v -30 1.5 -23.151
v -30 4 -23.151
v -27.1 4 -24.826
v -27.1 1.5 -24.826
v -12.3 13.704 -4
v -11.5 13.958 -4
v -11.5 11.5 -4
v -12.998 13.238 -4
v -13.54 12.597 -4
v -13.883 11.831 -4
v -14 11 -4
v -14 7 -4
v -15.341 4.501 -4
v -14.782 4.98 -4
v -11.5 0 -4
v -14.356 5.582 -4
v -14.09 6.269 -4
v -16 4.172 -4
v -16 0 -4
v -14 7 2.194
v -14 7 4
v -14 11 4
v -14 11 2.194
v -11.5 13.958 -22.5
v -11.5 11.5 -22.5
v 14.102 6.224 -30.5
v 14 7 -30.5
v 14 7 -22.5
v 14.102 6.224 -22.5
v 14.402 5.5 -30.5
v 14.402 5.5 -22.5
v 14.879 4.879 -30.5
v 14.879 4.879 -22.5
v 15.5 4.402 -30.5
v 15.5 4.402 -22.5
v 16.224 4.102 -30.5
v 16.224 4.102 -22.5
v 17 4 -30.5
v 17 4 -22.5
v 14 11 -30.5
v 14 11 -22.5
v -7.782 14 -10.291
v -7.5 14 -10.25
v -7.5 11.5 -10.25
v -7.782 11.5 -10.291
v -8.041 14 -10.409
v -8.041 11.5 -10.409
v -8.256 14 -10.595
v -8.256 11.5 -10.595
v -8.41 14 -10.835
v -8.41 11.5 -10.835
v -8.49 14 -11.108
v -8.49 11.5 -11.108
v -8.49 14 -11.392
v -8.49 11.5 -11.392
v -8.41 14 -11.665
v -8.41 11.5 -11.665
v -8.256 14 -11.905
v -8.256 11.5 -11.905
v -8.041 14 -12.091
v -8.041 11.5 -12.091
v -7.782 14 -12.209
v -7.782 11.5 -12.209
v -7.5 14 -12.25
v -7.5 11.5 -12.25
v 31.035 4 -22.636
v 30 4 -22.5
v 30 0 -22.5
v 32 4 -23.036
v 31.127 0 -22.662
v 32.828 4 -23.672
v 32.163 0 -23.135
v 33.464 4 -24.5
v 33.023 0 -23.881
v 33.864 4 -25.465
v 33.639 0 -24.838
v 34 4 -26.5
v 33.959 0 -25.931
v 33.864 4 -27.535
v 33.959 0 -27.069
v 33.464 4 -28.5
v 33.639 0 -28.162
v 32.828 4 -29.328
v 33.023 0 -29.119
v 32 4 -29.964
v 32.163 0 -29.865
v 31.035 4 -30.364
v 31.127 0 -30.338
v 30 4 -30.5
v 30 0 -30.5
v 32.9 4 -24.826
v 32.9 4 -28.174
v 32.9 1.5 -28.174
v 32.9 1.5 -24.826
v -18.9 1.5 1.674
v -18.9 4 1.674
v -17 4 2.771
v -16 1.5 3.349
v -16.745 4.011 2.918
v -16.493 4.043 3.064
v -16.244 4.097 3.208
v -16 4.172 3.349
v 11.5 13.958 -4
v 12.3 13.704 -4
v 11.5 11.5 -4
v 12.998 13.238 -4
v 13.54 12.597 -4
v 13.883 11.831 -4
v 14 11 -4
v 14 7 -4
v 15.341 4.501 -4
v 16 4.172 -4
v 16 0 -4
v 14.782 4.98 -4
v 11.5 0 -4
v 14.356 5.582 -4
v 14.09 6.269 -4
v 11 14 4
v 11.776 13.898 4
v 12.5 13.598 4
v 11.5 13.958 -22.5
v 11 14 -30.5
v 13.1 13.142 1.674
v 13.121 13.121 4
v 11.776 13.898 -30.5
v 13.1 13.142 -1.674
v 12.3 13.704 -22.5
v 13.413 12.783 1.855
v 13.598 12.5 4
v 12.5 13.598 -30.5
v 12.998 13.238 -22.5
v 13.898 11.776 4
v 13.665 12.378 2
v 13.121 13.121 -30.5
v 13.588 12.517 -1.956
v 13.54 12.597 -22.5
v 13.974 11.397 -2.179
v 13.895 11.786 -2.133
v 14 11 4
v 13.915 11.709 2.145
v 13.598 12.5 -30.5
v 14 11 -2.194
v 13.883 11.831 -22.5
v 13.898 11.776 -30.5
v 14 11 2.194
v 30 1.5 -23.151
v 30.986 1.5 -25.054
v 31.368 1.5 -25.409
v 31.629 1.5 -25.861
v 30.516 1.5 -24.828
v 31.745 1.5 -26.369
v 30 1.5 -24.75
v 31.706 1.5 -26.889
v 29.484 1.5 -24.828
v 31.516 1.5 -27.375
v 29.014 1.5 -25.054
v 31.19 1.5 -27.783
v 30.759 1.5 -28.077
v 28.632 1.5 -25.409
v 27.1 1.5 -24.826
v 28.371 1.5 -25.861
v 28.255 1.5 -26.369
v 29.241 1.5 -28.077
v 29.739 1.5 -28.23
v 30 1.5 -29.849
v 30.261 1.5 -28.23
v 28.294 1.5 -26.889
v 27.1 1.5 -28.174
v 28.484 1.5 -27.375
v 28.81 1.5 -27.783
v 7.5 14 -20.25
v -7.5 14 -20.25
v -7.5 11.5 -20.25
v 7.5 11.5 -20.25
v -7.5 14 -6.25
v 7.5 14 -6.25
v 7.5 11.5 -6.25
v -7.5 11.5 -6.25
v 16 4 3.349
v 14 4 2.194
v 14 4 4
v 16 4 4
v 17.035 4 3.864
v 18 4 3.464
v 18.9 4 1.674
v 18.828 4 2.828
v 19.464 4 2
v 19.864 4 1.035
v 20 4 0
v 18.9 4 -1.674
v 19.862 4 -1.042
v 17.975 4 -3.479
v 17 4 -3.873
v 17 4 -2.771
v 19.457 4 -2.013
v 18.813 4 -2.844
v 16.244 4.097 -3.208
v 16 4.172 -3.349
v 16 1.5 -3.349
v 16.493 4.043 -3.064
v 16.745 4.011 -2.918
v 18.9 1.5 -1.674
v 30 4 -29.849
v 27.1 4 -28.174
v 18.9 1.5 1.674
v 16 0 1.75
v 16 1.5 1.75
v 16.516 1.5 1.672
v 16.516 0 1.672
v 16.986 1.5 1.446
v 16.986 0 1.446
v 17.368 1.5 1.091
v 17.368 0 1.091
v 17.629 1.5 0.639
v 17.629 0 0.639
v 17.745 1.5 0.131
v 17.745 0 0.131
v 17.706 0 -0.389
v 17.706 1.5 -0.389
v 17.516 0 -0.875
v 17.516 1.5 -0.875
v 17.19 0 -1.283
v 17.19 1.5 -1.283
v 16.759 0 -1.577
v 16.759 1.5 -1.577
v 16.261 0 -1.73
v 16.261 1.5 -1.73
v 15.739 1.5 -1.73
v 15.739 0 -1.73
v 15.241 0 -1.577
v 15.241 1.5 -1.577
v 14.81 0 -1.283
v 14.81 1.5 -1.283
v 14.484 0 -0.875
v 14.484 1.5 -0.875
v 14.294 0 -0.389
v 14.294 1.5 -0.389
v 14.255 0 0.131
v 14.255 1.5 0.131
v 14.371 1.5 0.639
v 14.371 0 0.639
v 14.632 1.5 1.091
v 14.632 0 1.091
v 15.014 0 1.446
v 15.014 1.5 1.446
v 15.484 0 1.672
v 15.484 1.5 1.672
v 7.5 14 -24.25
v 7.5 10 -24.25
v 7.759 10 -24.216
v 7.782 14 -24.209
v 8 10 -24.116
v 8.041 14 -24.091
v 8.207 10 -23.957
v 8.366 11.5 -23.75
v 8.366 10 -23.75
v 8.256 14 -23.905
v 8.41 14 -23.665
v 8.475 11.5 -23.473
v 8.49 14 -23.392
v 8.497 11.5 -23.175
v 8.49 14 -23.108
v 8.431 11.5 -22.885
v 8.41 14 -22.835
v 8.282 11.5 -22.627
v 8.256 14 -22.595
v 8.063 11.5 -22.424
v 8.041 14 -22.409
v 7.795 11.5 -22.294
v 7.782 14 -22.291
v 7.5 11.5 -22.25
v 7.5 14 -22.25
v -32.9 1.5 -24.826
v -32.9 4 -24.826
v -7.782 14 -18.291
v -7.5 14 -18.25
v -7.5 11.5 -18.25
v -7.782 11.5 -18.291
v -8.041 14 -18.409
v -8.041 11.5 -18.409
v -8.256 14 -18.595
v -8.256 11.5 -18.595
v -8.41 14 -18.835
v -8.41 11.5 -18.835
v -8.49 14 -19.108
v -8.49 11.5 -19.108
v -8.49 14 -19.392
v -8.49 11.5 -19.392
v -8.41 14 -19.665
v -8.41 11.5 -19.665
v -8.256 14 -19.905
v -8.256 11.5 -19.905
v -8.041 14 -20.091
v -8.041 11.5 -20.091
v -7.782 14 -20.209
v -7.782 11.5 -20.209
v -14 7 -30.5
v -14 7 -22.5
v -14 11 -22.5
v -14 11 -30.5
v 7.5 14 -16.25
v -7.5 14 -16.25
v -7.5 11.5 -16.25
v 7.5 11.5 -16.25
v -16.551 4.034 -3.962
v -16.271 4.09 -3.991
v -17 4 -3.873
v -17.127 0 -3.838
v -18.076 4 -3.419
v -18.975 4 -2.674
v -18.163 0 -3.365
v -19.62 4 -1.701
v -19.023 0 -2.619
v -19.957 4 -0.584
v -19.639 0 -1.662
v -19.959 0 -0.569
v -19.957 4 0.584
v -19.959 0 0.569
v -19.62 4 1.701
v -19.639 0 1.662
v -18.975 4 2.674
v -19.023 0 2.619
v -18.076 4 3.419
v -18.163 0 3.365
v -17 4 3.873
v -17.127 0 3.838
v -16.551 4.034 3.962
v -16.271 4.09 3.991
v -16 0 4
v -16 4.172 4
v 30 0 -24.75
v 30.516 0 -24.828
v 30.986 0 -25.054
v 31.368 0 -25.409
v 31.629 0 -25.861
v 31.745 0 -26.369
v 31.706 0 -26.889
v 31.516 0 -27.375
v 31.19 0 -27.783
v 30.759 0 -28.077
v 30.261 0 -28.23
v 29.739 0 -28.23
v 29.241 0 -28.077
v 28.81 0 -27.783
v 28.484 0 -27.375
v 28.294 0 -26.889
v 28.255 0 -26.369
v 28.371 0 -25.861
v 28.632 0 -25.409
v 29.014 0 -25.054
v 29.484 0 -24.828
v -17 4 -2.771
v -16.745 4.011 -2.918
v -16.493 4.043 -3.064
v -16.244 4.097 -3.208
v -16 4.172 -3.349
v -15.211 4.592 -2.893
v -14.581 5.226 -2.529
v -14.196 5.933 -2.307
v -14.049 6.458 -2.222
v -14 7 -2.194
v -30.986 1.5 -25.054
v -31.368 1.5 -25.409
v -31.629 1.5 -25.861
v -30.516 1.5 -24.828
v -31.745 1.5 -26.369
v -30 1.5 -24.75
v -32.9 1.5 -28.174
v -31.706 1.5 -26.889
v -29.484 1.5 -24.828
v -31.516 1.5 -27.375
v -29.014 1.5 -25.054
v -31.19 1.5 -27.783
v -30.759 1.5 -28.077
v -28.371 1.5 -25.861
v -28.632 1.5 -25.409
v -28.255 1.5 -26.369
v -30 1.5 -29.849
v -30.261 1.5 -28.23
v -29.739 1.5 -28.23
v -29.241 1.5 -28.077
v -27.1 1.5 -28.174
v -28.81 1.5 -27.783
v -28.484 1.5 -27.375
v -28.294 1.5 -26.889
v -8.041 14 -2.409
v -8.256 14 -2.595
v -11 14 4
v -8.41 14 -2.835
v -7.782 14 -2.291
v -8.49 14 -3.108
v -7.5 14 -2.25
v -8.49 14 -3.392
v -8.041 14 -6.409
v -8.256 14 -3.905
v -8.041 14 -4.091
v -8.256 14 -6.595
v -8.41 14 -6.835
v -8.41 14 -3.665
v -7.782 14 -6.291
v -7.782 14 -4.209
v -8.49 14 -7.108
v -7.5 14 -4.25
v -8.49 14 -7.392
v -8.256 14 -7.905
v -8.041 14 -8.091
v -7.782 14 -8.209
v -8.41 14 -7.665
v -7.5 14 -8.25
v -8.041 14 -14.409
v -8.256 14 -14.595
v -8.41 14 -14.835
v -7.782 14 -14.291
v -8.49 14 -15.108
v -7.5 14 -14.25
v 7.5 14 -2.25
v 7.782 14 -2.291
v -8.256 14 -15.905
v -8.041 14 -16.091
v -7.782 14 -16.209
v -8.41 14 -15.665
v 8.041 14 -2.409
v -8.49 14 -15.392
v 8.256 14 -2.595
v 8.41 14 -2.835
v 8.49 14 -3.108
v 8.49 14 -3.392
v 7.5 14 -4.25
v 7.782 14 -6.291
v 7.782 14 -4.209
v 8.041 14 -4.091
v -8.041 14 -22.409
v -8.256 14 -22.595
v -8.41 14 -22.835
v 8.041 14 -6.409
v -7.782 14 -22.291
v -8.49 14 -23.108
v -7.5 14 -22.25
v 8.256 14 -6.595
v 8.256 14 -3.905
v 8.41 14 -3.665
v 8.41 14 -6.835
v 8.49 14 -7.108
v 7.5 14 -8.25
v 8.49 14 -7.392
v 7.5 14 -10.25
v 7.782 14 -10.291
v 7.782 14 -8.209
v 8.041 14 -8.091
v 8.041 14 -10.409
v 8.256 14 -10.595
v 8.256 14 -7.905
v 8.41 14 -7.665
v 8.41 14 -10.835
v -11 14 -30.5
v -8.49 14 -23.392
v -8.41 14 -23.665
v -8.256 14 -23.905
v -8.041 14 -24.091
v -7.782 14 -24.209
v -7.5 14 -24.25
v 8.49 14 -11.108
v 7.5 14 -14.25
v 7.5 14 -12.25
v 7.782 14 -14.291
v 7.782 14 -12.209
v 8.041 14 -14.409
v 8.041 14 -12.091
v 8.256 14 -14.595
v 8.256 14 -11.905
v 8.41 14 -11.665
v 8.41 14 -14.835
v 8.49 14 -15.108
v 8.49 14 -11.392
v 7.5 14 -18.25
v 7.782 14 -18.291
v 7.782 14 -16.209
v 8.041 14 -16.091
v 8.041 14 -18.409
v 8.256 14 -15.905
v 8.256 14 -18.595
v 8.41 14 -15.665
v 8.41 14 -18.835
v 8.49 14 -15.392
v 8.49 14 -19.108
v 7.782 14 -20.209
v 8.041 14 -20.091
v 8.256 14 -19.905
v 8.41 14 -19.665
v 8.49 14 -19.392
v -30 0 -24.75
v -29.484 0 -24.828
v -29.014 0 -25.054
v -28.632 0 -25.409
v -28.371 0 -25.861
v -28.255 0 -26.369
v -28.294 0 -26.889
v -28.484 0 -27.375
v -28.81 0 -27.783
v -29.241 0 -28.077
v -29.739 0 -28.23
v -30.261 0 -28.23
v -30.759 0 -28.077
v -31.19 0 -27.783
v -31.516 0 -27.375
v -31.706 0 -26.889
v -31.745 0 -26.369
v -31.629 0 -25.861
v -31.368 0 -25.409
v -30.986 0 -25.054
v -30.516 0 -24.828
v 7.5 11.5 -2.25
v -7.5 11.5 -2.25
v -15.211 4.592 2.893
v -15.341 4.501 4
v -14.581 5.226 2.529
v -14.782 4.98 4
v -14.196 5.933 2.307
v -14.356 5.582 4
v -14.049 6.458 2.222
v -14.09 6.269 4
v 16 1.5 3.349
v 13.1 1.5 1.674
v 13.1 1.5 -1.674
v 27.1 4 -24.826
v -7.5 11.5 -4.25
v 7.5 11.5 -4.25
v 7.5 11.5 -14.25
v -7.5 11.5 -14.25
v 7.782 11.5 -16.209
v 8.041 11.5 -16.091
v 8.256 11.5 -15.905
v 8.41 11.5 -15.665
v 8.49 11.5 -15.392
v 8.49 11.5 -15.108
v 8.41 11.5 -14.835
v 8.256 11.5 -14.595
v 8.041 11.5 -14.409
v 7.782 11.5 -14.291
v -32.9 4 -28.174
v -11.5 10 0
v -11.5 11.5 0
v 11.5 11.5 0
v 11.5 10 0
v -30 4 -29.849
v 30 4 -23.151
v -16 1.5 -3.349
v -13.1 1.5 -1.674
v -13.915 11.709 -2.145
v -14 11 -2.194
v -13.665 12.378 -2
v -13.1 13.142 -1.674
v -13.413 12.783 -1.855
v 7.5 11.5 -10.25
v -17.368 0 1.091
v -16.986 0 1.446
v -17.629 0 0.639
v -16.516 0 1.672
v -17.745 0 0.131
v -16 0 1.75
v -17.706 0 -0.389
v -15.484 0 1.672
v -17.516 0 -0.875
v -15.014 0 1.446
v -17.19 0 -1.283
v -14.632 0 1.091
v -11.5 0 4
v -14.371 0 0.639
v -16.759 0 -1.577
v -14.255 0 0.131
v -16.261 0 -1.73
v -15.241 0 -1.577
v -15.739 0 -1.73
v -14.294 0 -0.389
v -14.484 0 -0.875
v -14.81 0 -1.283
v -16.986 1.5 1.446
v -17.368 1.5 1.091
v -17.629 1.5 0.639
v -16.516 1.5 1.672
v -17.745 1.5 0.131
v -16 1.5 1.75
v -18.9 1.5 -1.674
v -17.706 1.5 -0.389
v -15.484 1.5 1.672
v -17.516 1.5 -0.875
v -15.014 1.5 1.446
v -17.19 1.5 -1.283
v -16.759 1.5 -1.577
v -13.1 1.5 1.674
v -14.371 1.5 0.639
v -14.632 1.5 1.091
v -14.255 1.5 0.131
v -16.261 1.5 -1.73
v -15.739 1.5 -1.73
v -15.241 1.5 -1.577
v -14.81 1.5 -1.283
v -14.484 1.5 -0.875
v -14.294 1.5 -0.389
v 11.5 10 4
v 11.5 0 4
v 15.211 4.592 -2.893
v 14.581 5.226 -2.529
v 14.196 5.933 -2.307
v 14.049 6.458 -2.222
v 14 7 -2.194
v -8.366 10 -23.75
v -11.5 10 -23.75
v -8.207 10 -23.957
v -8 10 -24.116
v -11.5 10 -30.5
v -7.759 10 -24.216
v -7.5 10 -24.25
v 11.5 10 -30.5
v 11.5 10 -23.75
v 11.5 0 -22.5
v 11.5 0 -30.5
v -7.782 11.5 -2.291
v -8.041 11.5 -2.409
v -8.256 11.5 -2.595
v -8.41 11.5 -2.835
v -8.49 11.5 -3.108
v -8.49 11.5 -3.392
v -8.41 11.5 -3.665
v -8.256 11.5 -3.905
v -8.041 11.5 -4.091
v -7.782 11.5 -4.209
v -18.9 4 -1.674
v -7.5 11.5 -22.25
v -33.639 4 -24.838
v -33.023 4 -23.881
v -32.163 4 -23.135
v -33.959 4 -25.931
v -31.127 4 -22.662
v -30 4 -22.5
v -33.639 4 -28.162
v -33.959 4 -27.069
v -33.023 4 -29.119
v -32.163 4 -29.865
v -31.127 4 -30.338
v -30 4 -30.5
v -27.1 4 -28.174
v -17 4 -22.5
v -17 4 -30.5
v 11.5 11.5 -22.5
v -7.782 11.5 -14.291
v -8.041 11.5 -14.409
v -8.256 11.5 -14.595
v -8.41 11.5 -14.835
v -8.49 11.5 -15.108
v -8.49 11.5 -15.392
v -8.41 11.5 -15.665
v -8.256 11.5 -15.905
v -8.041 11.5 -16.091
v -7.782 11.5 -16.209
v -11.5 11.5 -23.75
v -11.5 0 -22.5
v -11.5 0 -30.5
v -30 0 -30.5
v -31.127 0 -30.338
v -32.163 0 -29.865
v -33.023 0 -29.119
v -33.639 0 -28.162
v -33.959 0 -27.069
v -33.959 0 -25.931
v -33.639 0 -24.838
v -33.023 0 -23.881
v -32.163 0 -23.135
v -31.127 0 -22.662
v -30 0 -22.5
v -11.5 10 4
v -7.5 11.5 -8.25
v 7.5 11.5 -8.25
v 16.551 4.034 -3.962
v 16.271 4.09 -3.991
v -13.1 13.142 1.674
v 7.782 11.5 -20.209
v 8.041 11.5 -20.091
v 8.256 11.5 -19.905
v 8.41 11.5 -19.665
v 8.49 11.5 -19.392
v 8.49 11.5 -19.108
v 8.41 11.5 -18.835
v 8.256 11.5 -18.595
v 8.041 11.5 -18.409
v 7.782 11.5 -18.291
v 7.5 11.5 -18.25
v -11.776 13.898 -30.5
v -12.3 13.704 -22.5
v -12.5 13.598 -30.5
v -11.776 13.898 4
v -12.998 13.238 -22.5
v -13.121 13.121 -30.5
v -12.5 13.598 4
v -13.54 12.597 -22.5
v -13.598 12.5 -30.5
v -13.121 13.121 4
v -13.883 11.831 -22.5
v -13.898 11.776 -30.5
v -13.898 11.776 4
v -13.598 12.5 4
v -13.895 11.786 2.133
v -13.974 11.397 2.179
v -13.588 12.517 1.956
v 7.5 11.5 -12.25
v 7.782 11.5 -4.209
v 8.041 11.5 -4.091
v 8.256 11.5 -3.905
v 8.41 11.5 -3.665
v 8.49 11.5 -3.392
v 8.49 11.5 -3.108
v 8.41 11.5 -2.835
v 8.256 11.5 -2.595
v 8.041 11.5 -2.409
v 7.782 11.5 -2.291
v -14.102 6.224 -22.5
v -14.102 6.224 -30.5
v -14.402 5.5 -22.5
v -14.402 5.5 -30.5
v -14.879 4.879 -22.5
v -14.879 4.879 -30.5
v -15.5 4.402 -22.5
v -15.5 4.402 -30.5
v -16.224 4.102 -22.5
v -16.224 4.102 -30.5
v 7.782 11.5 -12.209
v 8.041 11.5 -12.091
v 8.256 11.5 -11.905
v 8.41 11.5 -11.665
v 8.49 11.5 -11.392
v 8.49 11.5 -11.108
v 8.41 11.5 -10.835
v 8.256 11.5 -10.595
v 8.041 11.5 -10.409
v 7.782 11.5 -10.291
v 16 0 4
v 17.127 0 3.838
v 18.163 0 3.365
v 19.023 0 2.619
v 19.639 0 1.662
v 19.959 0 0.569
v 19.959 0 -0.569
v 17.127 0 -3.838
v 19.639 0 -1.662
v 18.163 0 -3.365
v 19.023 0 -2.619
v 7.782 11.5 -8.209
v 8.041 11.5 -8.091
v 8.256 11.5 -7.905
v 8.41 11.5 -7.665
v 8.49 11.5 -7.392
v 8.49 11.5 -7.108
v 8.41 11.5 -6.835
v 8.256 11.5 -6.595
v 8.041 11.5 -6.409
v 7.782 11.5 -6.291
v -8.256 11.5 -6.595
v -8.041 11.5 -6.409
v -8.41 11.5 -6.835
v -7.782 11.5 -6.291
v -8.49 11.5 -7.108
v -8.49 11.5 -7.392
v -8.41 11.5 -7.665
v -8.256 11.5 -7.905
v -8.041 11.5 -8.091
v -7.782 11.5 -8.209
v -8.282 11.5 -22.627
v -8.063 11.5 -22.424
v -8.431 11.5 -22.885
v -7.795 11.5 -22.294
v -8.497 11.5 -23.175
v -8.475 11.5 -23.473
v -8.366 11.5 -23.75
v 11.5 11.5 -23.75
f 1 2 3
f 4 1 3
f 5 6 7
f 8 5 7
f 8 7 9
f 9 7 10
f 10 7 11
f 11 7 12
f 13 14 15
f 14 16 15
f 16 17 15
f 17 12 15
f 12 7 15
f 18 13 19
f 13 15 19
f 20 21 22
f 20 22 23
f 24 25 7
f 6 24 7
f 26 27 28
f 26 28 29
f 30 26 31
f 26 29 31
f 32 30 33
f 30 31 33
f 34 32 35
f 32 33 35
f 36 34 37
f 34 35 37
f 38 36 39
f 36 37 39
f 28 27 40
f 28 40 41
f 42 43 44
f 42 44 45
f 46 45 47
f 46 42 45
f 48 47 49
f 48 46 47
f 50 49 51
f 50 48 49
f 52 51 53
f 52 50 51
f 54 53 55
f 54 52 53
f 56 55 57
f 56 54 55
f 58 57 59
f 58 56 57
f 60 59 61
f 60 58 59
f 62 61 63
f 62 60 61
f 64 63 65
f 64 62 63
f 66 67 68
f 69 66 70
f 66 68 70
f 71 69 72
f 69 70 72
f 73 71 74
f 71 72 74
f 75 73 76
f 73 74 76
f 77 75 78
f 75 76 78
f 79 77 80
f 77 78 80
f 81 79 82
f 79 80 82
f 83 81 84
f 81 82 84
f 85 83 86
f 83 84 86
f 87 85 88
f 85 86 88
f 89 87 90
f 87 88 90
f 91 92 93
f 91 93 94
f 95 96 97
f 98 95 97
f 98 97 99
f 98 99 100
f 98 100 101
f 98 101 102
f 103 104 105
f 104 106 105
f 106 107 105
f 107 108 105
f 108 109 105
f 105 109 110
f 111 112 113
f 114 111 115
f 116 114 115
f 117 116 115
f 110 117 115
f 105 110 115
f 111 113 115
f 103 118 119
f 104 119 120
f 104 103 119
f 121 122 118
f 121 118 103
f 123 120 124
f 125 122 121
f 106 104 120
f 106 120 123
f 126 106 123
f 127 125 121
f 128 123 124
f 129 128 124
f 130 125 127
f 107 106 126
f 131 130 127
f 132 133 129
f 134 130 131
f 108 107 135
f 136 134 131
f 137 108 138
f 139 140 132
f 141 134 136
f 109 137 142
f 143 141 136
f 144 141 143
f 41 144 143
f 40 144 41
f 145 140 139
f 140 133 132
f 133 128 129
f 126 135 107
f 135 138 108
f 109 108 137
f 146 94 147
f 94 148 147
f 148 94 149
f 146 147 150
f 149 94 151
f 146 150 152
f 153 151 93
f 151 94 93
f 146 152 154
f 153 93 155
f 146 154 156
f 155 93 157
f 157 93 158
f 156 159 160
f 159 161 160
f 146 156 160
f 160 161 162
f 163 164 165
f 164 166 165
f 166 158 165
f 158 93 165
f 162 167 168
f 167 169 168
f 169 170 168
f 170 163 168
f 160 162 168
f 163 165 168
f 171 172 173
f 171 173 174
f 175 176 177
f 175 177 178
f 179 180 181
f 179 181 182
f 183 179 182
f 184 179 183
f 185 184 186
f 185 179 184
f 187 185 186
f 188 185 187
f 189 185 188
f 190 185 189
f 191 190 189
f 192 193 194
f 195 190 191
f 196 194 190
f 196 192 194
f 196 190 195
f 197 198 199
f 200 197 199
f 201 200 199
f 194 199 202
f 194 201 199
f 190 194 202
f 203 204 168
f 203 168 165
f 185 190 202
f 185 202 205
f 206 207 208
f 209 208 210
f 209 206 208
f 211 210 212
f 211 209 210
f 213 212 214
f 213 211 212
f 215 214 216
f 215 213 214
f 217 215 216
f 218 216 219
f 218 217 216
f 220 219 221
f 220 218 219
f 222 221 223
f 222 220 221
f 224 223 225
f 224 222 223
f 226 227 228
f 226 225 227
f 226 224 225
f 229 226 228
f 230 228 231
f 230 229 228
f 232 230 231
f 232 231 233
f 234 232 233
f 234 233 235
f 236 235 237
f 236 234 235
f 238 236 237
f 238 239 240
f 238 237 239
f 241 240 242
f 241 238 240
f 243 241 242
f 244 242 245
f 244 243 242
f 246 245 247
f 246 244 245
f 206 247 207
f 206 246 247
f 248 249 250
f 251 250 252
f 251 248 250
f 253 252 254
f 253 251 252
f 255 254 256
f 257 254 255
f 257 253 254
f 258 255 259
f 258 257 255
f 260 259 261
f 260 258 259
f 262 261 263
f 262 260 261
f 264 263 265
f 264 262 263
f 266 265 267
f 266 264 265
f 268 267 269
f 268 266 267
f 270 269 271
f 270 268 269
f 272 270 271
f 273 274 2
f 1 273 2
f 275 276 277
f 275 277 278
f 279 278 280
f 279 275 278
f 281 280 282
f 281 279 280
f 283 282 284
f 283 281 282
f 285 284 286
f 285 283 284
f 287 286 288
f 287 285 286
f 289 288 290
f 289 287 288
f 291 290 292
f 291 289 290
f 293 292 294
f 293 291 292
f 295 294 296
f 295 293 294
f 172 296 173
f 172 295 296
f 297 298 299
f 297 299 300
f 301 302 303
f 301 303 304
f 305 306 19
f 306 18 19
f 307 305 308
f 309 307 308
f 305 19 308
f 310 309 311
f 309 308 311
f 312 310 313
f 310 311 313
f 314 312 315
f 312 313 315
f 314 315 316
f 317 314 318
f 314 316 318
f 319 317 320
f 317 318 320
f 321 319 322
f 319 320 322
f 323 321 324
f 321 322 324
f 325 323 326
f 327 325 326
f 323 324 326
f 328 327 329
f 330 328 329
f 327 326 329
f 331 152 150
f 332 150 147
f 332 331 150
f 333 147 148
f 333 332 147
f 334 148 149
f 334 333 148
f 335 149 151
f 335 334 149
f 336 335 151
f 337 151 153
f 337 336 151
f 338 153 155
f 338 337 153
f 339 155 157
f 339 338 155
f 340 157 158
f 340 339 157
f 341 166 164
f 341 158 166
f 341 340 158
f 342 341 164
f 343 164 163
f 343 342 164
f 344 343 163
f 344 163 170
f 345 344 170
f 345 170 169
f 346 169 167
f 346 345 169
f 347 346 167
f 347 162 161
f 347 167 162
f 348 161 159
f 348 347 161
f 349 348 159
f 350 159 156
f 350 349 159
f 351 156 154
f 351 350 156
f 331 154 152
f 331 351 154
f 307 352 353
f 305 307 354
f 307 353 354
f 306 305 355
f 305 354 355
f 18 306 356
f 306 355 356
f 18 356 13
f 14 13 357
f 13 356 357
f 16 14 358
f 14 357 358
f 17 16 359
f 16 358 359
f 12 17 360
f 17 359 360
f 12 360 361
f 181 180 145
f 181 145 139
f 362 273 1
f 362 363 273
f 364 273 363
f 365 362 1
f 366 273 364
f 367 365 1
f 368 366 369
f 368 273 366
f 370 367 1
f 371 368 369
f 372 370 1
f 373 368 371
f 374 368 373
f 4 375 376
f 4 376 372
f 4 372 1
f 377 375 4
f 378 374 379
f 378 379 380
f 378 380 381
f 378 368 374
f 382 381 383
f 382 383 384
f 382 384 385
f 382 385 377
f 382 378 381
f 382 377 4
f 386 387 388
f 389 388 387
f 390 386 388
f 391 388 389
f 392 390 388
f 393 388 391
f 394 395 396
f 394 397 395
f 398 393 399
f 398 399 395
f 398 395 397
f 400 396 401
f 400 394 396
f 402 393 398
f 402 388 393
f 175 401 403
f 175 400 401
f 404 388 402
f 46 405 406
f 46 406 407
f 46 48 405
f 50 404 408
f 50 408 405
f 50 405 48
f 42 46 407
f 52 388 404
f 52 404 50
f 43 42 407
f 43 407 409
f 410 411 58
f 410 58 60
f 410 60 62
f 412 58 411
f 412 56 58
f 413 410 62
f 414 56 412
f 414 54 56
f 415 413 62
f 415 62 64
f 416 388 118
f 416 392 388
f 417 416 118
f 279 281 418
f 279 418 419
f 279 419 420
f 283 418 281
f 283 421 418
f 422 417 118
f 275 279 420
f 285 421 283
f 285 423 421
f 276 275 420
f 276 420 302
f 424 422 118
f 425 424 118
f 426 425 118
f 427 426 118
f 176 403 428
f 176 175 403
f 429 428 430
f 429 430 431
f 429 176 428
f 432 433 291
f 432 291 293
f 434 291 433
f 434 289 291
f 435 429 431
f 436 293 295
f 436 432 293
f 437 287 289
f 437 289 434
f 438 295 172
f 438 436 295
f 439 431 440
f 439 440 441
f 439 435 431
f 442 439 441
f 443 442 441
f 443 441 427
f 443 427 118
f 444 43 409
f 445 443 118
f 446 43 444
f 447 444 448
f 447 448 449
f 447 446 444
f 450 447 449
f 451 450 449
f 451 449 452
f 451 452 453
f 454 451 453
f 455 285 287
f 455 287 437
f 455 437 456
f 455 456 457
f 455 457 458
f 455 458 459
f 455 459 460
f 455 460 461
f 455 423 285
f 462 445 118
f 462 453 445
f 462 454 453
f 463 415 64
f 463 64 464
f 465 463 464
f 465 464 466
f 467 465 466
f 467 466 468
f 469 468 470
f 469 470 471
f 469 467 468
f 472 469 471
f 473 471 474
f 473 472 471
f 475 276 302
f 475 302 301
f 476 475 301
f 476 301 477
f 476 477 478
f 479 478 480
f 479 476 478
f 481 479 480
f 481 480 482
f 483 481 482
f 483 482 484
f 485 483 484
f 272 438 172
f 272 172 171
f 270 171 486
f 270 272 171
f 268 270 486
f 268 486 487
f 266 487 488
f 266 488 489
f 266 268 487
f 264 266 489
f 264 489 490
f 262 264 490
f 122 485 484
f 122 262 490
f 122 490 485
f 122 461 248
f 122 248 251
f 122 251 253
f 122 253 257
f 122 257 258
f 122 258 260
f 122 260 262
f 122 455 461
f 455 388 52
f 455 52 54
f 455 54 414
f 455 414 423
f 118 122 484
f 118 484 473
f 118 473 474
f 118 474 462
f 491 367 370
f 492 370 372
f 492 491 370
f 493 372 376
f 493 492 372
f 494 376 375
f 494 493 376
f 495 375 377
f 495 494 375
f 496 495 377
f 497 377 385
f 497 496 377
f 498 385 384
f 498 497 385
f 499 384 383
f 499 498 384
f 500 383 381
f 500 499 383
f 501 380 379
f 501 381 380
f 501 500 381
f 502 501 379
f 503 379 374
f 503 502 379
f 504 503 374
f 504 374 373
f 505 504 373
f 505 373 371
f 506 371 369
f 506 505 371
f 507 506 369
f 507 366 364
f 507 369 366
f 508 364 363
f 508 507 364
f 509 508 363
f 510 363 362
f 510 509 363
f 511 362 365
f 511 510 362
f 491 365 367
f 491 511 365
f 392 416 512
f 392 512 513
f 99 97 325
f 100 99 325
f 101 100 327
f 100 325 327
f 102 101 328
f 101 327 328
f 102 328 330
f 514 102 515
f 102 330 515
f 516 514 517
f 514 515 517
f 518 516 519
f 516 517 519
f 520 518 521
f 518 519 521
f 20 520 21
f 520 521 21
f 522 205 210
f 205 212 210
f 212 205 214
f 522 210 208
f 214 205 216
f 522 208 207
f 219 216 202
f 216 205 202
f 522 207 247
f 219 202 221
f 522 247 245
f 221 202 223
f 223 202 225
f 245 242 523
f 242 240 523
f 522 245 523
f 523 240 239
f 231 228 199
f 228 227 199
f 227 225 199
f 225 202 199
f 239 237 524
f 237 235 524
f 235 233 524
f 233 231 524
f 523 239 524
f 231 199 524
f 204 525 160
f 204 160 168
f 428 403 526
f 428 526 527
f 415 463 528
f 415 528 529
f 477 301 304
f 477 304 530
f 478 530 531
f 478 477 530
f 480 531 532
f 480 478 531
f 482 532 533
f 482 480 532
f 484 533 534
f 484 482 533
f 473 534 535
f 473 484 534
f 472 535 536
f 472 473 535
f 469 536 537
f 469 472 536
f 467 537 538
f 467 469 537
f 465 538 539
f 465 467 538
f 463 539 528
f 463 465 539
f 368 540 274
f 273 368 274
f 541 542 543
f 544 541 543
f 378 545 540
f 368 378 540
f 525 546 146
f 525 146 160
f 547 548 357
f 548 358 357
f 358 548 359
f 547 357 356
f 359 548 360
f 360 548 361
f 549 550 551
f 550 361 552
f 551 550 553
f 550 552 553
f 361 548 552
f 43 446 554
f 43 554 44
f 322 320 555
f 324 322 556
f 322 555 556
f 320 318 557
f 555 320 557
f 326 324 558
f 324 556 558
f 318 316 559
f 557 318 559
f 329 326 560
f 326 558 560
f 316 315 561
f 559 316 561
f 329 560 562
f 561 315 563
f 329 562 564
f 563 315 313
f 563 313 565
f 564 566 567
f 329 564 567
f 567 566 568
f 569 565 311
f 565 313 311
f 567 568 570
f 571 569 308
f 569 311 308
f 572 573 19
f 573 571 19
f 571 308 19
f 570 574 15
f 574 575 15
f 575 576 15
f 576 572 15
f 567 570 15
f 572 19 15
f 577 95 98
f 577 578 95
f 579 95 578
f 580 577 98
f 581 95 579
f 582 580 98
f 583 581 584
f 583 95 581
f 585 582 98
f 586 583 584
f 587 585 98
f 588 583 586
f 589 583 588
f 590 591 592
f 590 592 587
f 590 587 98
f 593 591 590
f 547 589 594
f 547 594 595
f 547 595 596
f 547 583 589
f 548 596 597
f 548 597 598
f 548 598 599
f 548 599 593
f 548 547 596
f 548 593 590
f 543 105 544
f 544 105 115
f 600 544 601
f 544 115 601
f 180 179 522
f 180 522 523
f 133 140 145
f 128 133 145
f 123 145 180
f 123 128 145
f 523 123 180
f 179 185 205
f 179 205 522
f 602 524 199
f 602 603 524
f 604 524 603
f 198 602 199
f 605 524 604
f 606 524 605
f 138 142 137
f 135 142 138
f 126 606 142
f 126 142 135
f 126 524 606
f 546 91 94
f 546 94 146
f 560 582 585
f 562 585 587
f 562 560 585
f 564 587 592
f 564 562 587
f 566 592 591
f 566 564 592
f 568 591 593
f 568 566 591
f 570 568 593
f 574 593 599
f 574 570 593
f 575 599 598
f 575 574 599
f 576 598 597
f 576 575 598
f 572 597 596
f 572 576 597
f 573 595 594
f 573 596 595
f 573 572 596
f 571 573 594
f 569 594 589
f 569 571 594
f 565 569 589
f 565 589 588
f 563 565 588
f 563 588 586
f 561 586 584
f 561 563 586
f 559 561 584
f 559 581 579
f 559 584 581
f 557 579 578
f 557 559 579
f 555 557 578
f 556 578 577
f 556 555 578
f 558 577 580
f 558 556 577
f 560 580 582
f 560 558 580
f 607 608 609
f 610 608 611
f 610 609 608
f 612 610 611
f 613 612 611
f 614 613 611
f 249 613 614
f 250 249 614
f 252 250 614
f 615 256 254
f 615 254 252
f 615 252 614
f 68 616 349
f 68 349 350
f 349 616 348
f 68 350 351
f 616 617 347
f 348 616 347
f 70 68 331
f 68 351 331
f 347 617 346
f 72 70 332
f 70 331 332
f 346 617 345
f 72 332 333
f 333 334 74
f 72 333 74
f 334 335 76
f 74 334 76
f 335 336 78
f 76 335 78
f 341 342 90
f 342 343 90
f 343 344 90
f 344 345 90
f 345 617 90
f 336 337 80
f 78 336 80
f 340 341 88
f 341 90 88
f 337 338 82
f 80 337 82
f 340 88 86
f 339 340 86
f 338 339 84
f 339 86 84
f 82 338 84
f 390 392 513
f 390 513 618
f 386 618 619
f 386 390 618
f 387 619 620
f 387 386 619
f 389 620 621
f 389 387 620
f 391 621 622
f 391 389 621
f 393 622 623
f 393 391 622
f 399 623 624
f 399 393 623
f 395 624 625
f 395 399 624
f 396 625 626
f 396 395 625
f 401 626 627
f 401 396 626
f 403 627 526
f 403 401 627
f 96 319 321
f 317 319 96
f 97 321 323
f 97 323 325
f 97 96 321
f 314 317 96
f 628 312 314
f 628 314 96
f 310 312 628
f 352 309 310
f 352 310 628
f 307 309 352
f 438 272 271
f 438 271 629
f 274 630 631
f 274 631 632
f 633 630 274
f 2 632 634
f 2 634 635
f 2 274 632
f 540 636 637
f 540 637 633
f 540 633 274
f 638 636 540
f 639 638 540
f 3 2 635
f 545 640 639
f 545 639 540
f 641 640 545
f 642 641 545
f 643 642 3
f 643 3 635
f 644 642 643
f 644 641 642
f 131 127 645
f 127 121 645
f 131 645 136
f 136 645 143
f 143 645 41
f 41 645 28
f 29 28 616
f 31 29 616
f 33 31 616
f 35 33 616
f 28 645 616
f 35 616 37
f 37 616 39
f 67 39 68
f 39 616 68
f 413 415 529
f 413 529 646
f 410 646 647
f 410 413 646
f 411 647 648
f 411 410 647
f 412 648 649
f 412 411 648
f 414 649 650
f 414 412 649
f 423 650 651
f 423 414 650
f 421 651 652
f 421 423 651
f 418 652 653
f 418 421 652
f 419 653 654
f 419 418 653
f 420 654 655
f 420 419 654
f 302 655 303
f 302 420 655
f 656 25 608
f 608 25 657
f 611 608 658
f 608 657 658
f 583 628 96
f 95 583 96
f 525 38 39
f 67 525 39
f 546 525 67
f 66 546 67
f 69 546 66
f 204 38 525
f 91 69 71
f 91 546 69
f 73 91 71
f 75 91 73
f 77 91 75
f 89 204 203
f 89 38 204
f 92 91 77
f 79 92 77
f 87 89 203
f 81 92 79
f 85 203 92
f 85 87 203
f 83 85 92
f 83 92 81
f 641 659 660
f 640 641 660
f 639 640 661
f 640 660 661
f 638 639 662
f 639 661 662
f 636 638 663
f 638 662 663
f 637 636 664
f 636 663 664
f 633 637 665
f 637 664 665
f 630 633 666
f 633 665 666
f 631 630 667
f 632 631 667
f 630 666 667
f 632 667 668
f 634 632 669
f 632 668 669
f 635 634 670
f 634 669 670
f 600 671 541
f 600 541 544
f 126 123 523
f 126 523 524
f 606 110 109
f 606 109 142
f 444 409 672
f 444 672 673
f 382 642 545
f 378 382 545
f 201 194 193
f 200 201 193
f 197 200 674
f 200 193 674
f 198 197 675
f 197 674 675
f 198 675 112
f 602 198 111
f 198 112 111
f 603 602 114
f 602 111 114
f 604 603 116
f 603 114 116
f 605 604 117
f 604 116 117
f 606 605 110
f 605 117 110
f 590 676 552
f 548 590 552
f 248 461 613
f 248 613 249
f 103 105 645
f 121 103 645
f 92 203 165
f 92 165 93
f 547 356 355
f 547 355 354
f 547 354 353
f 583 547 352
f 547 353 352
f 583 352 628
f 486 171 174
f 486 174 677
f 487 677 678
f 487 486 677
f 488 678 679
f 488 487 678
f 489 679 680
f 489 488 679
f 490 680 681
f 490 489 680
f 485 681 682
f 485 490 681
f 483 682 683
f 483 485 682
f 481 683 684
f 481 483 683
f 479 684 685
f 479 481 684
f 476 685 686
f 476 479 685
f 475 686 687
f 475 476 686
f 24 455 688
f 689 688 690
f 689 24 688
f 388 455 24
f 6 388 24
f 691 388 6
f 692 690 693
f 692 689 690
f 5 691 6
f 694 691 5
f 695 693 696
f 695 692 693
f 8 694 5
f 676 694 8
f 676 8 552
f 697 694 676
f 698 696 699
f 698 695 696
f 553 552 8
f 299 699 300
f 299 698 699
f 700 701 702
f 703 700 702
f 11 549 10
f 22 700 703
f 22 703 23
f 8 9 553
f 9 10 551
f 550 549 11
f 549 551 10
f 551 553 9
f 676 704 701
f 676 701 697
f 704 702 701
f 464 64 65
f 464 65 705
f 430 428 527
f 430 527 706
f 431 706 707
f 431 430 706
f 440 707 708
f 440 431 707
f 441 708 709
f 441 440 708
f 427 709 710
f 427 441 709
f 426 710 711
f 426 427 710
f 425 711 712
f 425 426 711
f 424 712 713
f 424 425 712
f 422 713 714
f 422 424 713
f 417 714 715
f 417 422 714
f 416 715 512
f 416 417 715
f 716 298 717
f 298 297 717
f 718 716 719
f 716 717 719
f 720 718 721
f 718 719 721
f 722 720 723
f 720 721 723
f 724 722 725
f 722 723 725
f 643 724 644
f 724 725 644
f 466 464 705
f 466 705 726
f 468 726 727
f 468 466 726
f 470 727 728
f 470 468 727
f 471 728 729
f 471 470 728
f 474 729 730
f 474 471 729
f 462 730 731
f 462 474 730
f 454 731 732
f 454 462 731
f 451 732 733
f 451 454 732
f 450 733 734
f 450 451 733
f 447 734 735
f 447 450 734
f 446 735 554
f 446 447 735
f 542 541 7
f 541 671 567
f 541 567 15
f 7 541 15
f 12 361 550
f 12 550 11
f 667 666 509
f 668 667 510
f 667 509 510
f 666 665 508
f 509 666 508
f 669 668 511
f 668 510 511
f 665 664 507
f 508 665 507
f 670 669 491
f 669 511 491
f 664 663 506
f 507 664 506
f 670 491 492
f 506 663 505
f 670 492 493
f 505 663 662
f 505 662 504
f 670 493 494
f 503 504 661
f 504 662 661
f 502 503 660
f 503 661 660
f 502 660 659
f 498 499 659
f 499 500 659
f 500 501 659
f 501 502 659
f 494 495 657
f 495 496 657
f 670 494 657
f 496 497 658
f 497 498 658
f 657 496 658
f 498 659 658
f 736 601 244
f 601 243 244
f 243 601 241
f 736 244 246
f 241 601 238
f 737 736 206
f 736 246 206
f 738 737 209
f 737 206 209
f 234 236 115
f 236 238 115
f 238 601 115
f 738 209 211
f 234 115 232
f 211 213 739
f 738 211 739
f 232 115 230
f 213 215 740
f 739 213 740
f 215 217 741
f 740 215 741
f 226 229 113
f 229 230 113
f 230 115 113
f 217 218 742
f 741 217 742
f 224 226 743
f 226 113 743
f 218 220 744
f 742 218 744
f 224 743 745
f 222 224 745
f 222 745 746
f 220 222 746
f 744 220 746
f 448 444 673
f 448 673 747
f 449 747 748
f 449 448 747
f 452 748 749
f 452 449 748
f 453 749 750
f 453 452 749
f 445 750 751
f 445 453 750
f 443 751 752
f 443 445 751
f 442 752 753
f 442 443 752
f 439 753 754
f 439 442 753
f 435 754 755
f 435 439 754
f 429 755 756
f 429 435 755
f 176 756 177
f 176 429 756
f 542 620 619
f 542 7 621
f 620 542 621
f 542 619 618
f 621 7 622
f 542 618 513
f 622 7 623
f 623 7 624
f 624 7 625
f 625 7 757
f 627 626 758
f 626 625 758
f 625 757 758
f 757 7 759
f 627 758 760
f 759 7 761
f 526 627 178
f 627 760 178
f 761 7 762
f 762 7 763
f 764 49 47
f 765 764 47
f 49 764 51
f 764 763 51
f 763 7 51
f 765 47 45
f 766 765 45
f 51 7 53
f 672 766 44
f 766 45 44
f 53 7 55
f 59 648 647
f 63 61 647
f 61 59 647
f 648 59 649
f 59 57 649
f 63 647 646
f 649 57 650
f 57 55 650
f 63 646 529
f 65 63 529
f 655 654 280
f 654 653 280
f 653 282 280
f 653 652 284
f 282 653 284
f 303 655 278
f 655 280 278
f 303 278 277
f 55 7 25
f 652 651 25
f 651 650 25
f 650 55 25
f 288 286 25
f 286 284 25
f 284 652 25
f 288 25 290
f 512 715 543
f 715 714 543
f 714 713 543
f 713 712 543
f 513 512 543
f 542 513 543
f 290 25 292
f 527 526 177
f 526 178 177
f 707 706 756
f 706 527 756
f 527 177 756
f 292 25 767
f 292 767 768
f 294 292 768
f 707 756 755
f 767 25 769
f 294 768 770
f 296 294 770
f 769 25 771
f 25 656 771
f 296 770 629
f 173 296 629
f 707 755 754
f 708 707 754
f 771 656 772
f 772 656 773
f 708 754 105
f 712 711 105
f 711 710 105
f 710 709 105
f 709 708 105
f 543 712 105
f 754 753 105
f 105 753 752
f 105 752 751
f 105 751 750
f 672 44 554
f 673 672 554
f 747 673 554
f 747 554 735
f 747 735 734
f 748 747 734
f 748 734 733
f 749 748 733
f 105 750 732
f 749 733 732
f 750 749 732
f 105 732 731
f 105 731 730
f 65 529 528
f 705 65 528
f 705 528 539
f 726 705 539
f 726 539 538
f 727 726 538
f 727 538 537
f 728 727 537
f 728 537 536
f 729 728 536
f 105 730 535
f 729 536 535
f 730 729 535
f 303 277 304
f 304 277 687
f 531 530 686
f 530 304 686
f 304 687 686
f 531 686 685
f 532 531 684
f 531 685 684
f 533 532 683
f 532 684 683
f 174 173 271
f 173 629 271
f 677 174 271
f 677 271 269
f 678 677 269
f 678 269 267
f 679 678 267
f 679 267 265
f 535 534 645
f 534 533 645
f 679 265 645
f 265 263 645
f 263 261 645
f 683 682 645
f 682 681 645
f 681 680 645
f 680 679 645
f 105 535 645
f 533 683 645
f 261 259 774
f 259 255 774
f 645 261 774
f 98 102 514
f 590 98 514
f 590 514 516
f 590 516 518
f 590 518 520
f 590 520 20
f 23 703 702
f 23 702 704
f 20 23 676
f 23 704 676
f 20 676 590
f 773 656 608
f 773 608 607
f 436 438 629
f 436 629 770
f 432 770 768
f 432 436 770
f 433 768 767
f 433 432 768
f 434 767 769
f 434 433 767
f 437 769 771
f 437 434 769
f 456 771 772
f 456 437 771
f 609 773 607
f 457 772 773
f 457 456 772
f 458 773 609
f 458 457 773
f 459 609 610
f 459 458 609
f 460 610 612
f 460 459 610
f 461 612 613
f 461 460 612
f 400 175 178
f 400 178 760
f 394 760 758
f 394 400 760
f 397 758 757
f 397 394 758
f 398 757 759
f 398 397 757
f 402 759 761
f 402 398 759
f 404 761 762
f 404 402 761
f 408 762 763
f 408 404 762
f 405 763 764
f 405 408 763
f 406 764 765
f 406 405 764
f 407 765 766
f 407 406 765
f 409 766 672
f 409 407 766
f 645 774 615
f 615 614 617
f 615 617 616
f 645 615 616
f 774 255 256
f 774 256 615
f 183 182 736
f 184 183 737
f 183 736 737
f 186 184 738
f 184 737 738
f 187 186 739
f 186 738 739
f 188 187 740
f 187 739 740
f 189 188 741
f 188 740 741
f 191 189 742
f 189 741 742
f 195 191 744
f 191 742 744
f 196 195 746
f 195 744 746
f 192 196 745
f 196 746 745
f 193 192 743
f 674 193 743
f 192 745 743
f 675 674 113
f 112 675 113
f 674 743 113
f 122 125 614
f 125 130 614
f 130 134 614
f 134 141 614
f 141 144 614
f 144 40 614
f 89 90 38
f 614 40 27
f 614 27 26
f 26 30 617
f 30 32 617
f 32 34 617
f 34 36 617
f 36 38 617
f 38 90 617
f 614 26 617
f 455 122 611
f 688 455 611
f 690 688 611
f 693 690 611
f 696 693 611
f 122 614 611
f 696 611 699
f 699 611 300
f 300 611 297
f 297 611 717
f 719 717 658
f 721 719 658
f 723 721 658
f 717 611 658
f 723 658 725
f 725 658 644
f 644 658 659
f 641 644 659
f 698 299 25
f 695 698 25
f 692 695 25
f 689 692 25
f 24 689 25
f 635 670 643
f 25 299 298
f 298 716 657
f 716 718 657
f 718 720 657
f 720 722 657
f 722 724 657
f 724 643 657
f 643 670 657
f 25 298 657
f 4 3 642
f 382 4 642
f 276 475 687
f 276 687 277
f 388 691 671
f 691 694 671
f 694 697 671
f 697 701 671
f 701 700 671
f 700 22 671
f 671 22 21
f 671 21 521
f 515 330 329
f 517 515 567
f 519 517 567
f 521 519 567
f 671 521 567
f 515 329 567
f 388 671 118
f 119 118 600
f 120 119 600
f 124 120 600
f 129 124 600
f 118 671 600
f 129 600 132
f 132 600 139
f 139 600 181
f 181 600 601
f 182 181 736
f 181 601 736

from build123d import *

# Parameters (mm, degrees)
SKETCH1_R           = 4
SKETCH1_R_2         = 1.75
BOSS_EXTRUDE1_DEPTH = 11.5
SKETCH2_R           = 1.75
BOSS_EXTRUDE2_DEPTH = 2.5
CUT_EXTRUDE1_START  = -10
SKETCH3_R           = 1.75
CUT_EXTRUDE1_DEPTH  = 10
CUT_EXTRUDE2_DEPTH  = 12.5
SKETCH5_W           = 23
SKETCH5_H           = 4
SKETCH5_H_2         = 6.75
BOSS_EXTRUDE3_DEPTH = 1.5
FILLET1_R           = 3
CUT_EXTRUDE3_REACH  = 49.773


with BuildPart() as part:
    # Sketch1 → Boss-Extrude1 (new body)
    # profile 1 of 8: a face of its own
    with BuildSketch(Plane(origin=(0, 0, 0), x_dir=(1, 0, 0), z_dir=(0, 1, 0))):
        with Locations((-30, 26.5)):
            Circle(SKETCH1_R)
        with Locations(Location((-30, 26.5, 0), (0, 0, 270))):
            Circle(SKETCH1_R_2, mode=Mode.SUBTRACT)
    # profile 2 of 8: a face of its own
    with BuildSketch(Plane(origin=(0, 0, 0), x_dir=(1, 0, 0), z_dir=(0, 1, 0))):
        with BuildLine():
            Line((-30, 22.5), (-11.5, 22.5))
            Line((-11.5, 22.5), (-11.5, 30.5))
            Line((-11.5, 30.5), (-30, 30.5))
            ThreePointArc((-30, 30.5), (-27.171572875, 29.328427125), (-26, 26.5))
            ThreePointArc((-26, 26.5), (-27.171572875, 23.671572875), (-30, 22.5))
        make_face()
    # profile 3 of 8: a face of its own
    with BuildSketch(Plane(origin=(0, 0, 0), x_dir=(1, 0, 0), z_dir=(0, 1, 0))):
        with BuildLine():
            Line((11.5, 30.5), (11.5, 22.5))
            Line((11.5, 22.5), (30, 22.5))
            ThreePointArc((30, 22.5), (26, 26.5), (30, 30.5))
            Line((30, 30.5), (11.5, 30.5))
        make_face()
    # profile 4 of 8: a face of its own
    with BuildSketch(Plane(origin=(0, 0, 0), x_dir=(1, 0, 0), z_dir=(0, 1, 0))):
        with Locations((30, 26.5)):
            Circle(SKETCH1_R)
        with Locations(Location((30, 26.5, 0), (0, 0, 270))):
            Circle(SKETCH1_R_2, mode=Mode.SUBTRACT)
    # profile 5 of 8: a face of its own
    with BuildSketch(Plane(origin=(0, 0, 0), x_dir=(1, 0, 0), z_dir=(0, 1, 0))):
        with Locations((16, 0)):
            Circle(SKETCH1_R)
        with Locations(Location((16, 0, 0), (0, 0, 270))):
            Circle(SKETCH1_R_2, mode=Mode.SUBTRACT)
    # profile 6 of 8: a face of its own
    with BuildSketch(Plane(origin=(0, 0, 0), x_dir=(1, 0, 0), z_dir=(0, 1, 0))):
        with BuildLine():
            Line((11.5, 4), (11.5, -4))
            Line((11.5, -4), (16, -4))
            ThreePointArc((16, -4), (12, 0), (16, 4))
            Line((16, 4), (11.5, 4))
        make_face()
    # profile 7 of 8: a face of its own
    with BuildSketch(Plane(origin=(0, 0, 0), x_dir=(1, 0, 0), z_dir=(0, 1, 0))):
        with BuildLine():
            Line((-16, -4), (-11.5, -4))
            Line((-11.5, -4), (-11.5, 4))
            Line((-11.5, 4), (-16, 4))
            ThreePointArc((-16, 4), (-13.171572875, 2.828427125), (-12, 0))
            ThreePointArc((-12, 0), (-13.171572875, -2.828427125), (-16, -4))
        make_face()
    # profile 8 of 8: a face of its own
    with BuildSketch(Plane(origin=(0, 0, 0), x_dir=(1, 0, 0), z_dir=(0, 1, 0))):
        with Locations((-16, 0)):
            Circle(SKETCH1_R)
        with Locations(Location((-16, 0, 0), (0, 0, 270))):
            Circle(SKETCH1_R_2, mode=Mode.SUBTRACT)
    extrude(amount=BOSS_EXTRUDE1_DEPTH)

    # Sketch2 → Boss-Extrude2 (add)
    # profile 1 of 5: a face of its own
    with BuildSketch(Plane(origin=(0, 11.5, 0), x_dir=(1, 0, 0), z_dir=(0, 1, 0))):
        with BuildLine():
            Line((-11.5, 30.5), (-30, 30.5))
            ThreePointArc((-30, 30.5), (-34, 26.5), (-30, 22.5))
            Line((-30, 22.5), (-11.5, 22.5))
            Line((-11.5, 22.5), (-11.5, 30.5))
        make_face()
        with Locations(Location((-30, 26.5, 0), (0, 0, 270))):
            Circle(SKETCH2_R, mode=Mode.SUBTRACT)
    # profile 2 of 5: a face of its own
    with BuildSketch(Plane(origin=(0, 11.5, 0), x_dir=(1, 0, 0), z_dir=(0, 1, 0))):
        Polygon((11.5, 30.5), (-11.5, 30.5), (-11.5, 22.5), (-11.5, 4), (-11.5, -4), (11.5, -4), (11.5, 4), (11.5, 22.5), align=None)
    # profile 3 of 5: a face of its own
    with BuildSketch(Plane(origin=(0, 11.5, 0), x_dir=(1, 0, 0), z_dir=(0, 1, 0))):
        with BuildLine():
            Line((30, 30.5), (11.5, 30.5))
            Line((11.5, 30.5), (11.5, 22.5))
            Line((11.5, 22.5), (30, 22.5))
            ThreePointArc((30, 22.5), (34, 26.5), (30, 30.5))
        make_face()
        with Locations(Location((30, 26.5, 0), (0, 0, 270))):
            Circle(SKETCH2_R, mode=Mode.SUBTRACT)
    # profile 4 of 5: a face of its own
    with BuildSketch(Plane(origin=(0, 11.5, 0), x_dir=(1, 0, 0), z_dir=(0, 1, 0))):
        with BuildLine():
            Line((16, 4), (11.5, 4))
            Line((11.5, 4), (11.5, -4))
            Line((11.5, -4), (16, -4))
            ThreePointArc((16, -4), (20, 0), (16, 4))
        make_face()
        with Locations(Location((16, 0, 0), (0, 0, 270))):
            Circle(SKETCH2_R, mode=Mode.SUBTRACT)
    # profile 5 of 5: a face of its own
    with BuildSketch(Plane(origin=(0, 11.5, 0), x_dir=(1, 0, 0), z_dir=(0, 1, 0))):
        with BuildLine():
            Line((-11.5, -4), (-11.5, 4))
            Line((-11.5, 4), (-16, 4))
            ThreePointArc((-16, 4), (-20, 0), (-16, -4))
            Line((-16, -4), (-11.5, -4))
        make_face()
        with Locations(Location((-16, 0, 0), (0, 0, 270))):
            Circle(SKETCH2_R, mode=Mode.SUBTRACT)
    extrude(amount=BOSS_EXTRUDE2_DEPTH)

    # Sketch3 → Cut-Extrude1 (cut)
    # profile 1 of 10: a face of its own
    with BuildSketch(Plane(origin=(0, 14, 0), x_dir=(1, 0, 0), z_dir=(0, 1, 0)).offset(CUT_EXTRUDE1_START)):
        with BuildLine():
            ThreePointArc((-26, 26.5), (-27.171572875, 29.328427125), (-30, 30.5))
            ThreePointArc((-30, 30.5), (-34, 26.5), (-30, 22.5))
            ThreePointArc((-30, 22.5), (-27.171572875, 23.671572875), (-26, 26.5))
        make_face()
        with Locations(Location((-30, 26.5, 0), (0, 0, 270))):
            Circle(SKETCH3_R, mode=Mode.SUBTRACT)
    # profile 2 of 10: a face of its own
    with BuildSketch(Plane(origin=(0, 14, 0), x_dir=(1, 0, 0), z_dir=(0, 1, 0)).offset(CUT_EXTRUDE1_START)):
        with BuildLine():
            Line((-14, 22.5), (-14, 30.5))
            Line((-14, 30.5), (-30, 30.5))
            ThreePointArc((-30, 30.5), (-27.171572875, 29.328427125), (-26, 26.5))
            ThreePointArc((-26, 26.5), (-27.171572875, 23.671572875), (-30, 22.5))
            Line((-30, 22.5), (-14, 22.5))
        make_face()
    # profile 3 of 10: a face of its own
    with BuildSketch(Plane(origin=(0, 14, 0), x_dir=(1, 0, 0), z_dir=(0, 1, 0)).offset(CUT_EXTRUDE1_START)):
        with BuildLine():
            Line((30, 30.5), (14, 30.5))
            Line((14, 30.5), (14, 22.5))
            Line((14, 22.5), (30, 22.5))
            ThreePointArc((30, 22.5), (26, 26.5), (30, 30.5))
        make_face()
    # profile 4 of 10: a face of its own
    with BuildSketch(Plane(origin=(0, 14, 0), x_dir=(1, 0, 0), z_dir=(0, 1, 0)).offset(CUT_EXTRUDE1_START)):
        with BuildLine():
            ThreePointArc((34, 26.5), (32.828427125, 29.328427125), (30, 30.5))
            ThreePointArc((30, 30.5), (26, 26.5), (30, 22.5))
            ThreePointArc((30, 22.5), (32.828427125, 23.671572875), (34, 26.5))
        make_face()
        with Locations(Location((30, 26.5, 0), (0, 0, 270))):
            Circle(SKETCH3_R, mode=Mode.SUBTRACT)
    # profile 5 of 10: a face of its own
    with BuildSketch(Plane(origin=(0, 14, 0), x_dir=(1, 0, 0), z_dir=(0, 1, 0)).offset(CUT_EXTRUDE1_START)):
        with BuildLine():
            ThreePointArc((16, 4), (14.96472382, 3.863703305), (14, 3.464101615))
            Line((14, 3.464101615), (14, -3.464101615))
            ThreePointArc((14, -3.464101615), (14.96472382, -3.863703305), (16, -4))
            ThreePointArc((16, -4), (18.828427125, -2.828427125), (20, 0))
            ThreePointArc((20, 0), (18.828427125, 2.828427125), (16, 4))
        make_face()
        with Locations(Location((16, 0, 0), (0, 0, 270))):
            Circle(SKETCH3_R, mode=Mode.SUBTRACT)
    # profile 6 of 10: a face of its own
    with BuildSketch(Plane(origin=(0, 14, 0), x_dir=(1, 0, 0), z_dir=(0, 1, 0)).offset(CUT_EXTRUDE1_START)):
        with BuildLine():
            Line((-14, -3.464101615), (-14, 3.464101615))
            ThreePointArc((-14, 3.464101615), (-14.96472382, 3.863703305), (-16, 4))
            ThreePointArc((-16, 4), (-20, 0), (-16, -4))
            ThreePointArc((-16, -4), (-14.96472382, -3.863703305), (-14, -3.464101615))
        make_face()
        with Locations(Location((-16, 0, 0), (0, 0, 270))):
            Circle(SKETCH3_R, mode=Mode.SUBTRACT)
    # profile 7 of 10: a face of its own
    with BuildSketch(Plane(origin=(0, 14, 0), x_dir=(1, 0, 0), z_dir=(0, 1, 0)).offset(CUT_EXTRUDE1_START)):
        with BuildLine():
            Line((-14, -4), (-14, -3.464101615))
            ThreePointArc((-14, -3.464101615), (-14.96472382, -3.863703305), (-16, -4))
            Line((-16, -4), (-14, -4))
        make_face()
    # profile 8 of 10: a face of its own
    with BuildSketch(Plane(origin=(0, 14, 0), x_dir=(1, 0, 0), z_dir=(0, 1, 0)).offset(CUT_EXTRUDE1_START)):
        with BuildLine():
            Line((-14, 3.464101615), (-14, 4))
            Line((-14, 4), (-16, 4))
            ThreePointArc((-16, 4), (-14.96472382, 3.863703305), (-14, 3.464101615))
        make_face()
    # profile 9 of 10: a face of its own
    with BuildSketch(Plane(origin=(0, 14, 0), x_dir=(1, 0, 0), z_dir=(0, 1, 0)).offset(CUT_EXTRUDE1_START)):
        with BuildLine():
            Line((16, 4), (14, 4))
            Line((14, 4), (14, 3.464101615))
            ThreePointArc((14, 3.464101615), (14.96472382, 3.863703305), (16, 4))
        make_face()
    # profile 10 of 10: a face of its own
    with BuildSketch(Plane(origin=(0, 14, 0), x_dir=(1, 0, 0), z_dir=(0, 1, 0)).offset(CUT_EXTRUDE1_START)):
        with BuildLine():
            ThreePointArc((16, -4), (14.96472382, -3.863703305), (14, -3.464101615))
            Line((14, -3.464101615), (14, -4))
            Line((14, -4), (16, -4))
        make_face()
    extrude(amount=CUT_EXTRUDE1_DEPTH, mode=Mode.SUBTRACT)

    # Sketch4 → Cut-Extrude2 (cut)
    with BuildSketch(Plane(origin=(0, 14, 0), x_dir=(1, 0, 0), z_dir=(0, 1, 0))):
        Polygon((-27.1, 28.174315781), (-30, 29.848631561), (-32.9, 28.174315781), (-32.9, 24.825684219), (-30, 23.151368439), (-27.1, 24.825684219), align=None)
        Polygon((13.1, 1.674315781), (16, 3.348631561), (18.9, 1.674315781), (18.9, -1.674315781), (16, -3.348631561), (13.1, -1.674315781), align=None)
        Polygon((-13.1, 1.674315781), (-16, 3.348631561), (-18.9, 1.674315781), (-18.9, -1.674315781), (-16, -3.348631561), (-13.1, -1.674315781), align=None)
        Polygon((30, 23.151368439), (27.1, 24.825684219), (27.1, 28.174315781), (30, 29.848631561), (32.9, 28.174315781), (32.9, 24.825684219), align=None)
    extrude(amount=-CUT_EXTRUDE2_DEPTH, mode=Mode.SUBTRACT)

    # Sketch5 → Boss-Extrude3 (add)
    with BuildSketch(Plane.XZ.offset(-11.5)):
        with Locations((0, 2)):
            Rectangle(SKETCH5_W, SKETCH5_H)
        with Locations((0, -27.125)):
            Rectangle(SKETCH5_W, SKETCH5_H_2)
    extrude(amount=BOSS_EXTRUDE3_DEPTH)

    # Fillet1
    fillet1_edges = [part.edges().sort_by_distance(p)[0] for p in [
        (14, 4, -26.5),
        (14, 14, -3.096965511),
        (14, 4, -3.096965511),
        (-14, 14, 3.096965511),
        (-14, 4, 3.096965511),
        (-14, 4, -3.096965511),
        (-14, 4, -26.5),
    ]]
    fillet(fillet1_edges, radius=FILLET1_R)

    # Sketch6 → Cut-Extrude3 (cut, up to next)
    with BuildSketch(Plane(origin=(0, 14, 0), x_dir=(1, 0, 0), z_dir=(0, 1, 0)), mode=Mode.PRIVATE) as cut_extrude3_sk1:
        with BuildLine():
            Line((-7.5, 24.25), (7.5, 24.25))
            ThreePointArc((7.5, 24.25), (8.5, 23.25), (7.5, 22.25))
            Line((7.5, 22.25), (-7.5, 22.25))
            ThreePointArc((-7.5, 22.25), (-8.5, 23.25), (-7.5, 24.25))
        make_face()
    cut_extrude3_tool1 = extrude(cut_extrude3_sk1.sketch, amount=-CUT_EXTRUDE3_REACH, mode=Mode.PRIVATE) & part.part
    # Sketch6 → Cut-Extrude3 (cut, up to next)
    with BuildSketch(Plane(origin=(0, 14, 0), x_dir=(1, 0, 0), z_dir=(0, 1, 0)), mode=Mode.PRIVATE) as cut_extrude3_sk2:
        with BuildLine():
            Line((-7.5, 20.25), (7.5, 20.25))
            ThreePointArc((7.5, 20.25), (8.5, 19.25), (7.5, 18.25))
            Line((7.5, 18.25), (-7.5, 18.25))
            ThreePointArc((-7.5, 18.25), (-8.5, 19.25), (-7.5, 20.25))
        make_face()
    cut_extrude3_tool2 = extrude(cut_extrude3_sk2.sketch, amount=-CUT_EXTRUDE3_REACH, mode=Mode.PRIVATE) & part.part
    # Sketch6 → Cut-Extrude3 (cut, up to next)
    with BuildSketch(Plane(origin=(0, 14, 0), x_dir=(1, 0, 0), z_dir=(0, 1, 0)), mode=Mode.PRIVATE) as cut_extrude3_sk3:
        with BuildLine():
            Line((-7.5, 16.25), (7.5, 16.25))
            ThreePointArc((7.5, 16.25), (8.5, 15.25), (7.5, 14.25))
            Line((7.5, 14.25), (-7.5, 14.25))
            ThreePointArc((-7.5, 14.25), (-8.5, 15.25), (-7.5, 16.25))
        make_face()
    cut_extrude3_tool3 = extrude(cut_extrude3_sk3.sketch, amount=-CUT_EXTRUDE3_REACH, mode=Mode.PRIVATE) & part.part
    # Sketch6 → Cut-Extrude3 (cut, up to next)
    with BuildSketch(Plane(origin=(0, 14, 0), x_dir=(1, 0, 0), z_dir=(0, 1, 0)), mode=Mode.PRIVATE) as cut_extrude3_sk4:
        with BuildLine():
            Line((-7.5, 12.25), (7.5, 12.25))
            ThreePointArc((7.5, 12.25), (8.5, 11.25), (7.5, 10.25))
            Line((7.5, 10.25), (-7.5, 10.25))
            ThreePointArc((-7.5, 10.25), (-8.5, 11.25), (-7.5, 12.25))
        make_face()
    cut_extrude3_tool4 = extrude(cut_extrude3_sk4.sketch, amount=-CUT_EXTRUDE3_REACH, mode=Mode.PRIVATE) & part.part
    # Sketch6 → Cut-Extrude3 (cut, up to next)
    with BuildSketch(Plane(origin=(0, 14, 0), x_dir=(1, 0, 0), z_dir=(0, 1, 0)), mode=Mode.PRIVATE) as cut_extrude3_sk5:
        with BuildLine():
            Line((-7.5, 8.25), (7.5, 8.25))
            ThreePointArc((7.5, 8.25), (8.5, 7.25), (7.5, 6.25))
            Line((7.5, 6.25), (-7.5, 6.25))
            ThreePointArc((-7.5, 6.25), (-8.5, 7.25), (-7.5, 8.25))
        make_face()
    cut_extrude3_tool5 = extrude(cut_extrude3_sk5.sketch, amount=-CUT_EXTRUDE3_REACH, mode=Mode.PRIVATE) & part.part
    # Sketch6 → Cut-Extrude3 (cut, up to next)
    with BuildSketch(Plane(origin=(0, 14, 0), x_dir=(1, 0, 0), z_dir=(0, 1, 0)), mode=Mode.PRIVATE) as cut_extrude3_sk6:
        with BuildLine():
            Line((-7.5, 4.25), (7.5, 4.25))
            ThreePointArc((7.5, 4.25), (8.5, 3.25), (7.5, 2.25))
            Line((7.5, 2.25), (-7.5, 2.25))
            ThreePointArc((-7.5, 2.25), (-8.5, 3.25), (-7.5, 4.25))
        make_face()
    cut_extrude3_tool6 = extrude(cut_extrude3_sk6.sketch, amount=-CUT_EXTRUDE3_REACH, mode=Mode.PRIVATE) & part.part
    add(cut_extrude3_tool1.solids().sort_by_distance((0, 14, -23.25))[0], mode=Mode.SUBTRACT)
    add(cut_extrude3_tool2.solids().sort_by_distance((0, 14, -19.25))[0], mode=Mode.SUBTRACT)
    add(cut_extrude3_tool3.solids().sort_by_distance((0, 14, -15.25))[0], mode=Mode.SUBTRACT)
    add(cut_extrude3_tool4.solids().sort_by_distance((0, 14, -11.25))[0], mode=Mode.SUBTRACT)
    add(cut_extrude3_tool5.solids().sort_by_distance((0, 14, -7.25))[0], mode=Mode.SUBTRACT)
    add(cut_extrude3_tool6.solids().sort_by_distance((0, 14, -3.25))[0], mode=Mode.SUBTRACT)


solid = part.part
